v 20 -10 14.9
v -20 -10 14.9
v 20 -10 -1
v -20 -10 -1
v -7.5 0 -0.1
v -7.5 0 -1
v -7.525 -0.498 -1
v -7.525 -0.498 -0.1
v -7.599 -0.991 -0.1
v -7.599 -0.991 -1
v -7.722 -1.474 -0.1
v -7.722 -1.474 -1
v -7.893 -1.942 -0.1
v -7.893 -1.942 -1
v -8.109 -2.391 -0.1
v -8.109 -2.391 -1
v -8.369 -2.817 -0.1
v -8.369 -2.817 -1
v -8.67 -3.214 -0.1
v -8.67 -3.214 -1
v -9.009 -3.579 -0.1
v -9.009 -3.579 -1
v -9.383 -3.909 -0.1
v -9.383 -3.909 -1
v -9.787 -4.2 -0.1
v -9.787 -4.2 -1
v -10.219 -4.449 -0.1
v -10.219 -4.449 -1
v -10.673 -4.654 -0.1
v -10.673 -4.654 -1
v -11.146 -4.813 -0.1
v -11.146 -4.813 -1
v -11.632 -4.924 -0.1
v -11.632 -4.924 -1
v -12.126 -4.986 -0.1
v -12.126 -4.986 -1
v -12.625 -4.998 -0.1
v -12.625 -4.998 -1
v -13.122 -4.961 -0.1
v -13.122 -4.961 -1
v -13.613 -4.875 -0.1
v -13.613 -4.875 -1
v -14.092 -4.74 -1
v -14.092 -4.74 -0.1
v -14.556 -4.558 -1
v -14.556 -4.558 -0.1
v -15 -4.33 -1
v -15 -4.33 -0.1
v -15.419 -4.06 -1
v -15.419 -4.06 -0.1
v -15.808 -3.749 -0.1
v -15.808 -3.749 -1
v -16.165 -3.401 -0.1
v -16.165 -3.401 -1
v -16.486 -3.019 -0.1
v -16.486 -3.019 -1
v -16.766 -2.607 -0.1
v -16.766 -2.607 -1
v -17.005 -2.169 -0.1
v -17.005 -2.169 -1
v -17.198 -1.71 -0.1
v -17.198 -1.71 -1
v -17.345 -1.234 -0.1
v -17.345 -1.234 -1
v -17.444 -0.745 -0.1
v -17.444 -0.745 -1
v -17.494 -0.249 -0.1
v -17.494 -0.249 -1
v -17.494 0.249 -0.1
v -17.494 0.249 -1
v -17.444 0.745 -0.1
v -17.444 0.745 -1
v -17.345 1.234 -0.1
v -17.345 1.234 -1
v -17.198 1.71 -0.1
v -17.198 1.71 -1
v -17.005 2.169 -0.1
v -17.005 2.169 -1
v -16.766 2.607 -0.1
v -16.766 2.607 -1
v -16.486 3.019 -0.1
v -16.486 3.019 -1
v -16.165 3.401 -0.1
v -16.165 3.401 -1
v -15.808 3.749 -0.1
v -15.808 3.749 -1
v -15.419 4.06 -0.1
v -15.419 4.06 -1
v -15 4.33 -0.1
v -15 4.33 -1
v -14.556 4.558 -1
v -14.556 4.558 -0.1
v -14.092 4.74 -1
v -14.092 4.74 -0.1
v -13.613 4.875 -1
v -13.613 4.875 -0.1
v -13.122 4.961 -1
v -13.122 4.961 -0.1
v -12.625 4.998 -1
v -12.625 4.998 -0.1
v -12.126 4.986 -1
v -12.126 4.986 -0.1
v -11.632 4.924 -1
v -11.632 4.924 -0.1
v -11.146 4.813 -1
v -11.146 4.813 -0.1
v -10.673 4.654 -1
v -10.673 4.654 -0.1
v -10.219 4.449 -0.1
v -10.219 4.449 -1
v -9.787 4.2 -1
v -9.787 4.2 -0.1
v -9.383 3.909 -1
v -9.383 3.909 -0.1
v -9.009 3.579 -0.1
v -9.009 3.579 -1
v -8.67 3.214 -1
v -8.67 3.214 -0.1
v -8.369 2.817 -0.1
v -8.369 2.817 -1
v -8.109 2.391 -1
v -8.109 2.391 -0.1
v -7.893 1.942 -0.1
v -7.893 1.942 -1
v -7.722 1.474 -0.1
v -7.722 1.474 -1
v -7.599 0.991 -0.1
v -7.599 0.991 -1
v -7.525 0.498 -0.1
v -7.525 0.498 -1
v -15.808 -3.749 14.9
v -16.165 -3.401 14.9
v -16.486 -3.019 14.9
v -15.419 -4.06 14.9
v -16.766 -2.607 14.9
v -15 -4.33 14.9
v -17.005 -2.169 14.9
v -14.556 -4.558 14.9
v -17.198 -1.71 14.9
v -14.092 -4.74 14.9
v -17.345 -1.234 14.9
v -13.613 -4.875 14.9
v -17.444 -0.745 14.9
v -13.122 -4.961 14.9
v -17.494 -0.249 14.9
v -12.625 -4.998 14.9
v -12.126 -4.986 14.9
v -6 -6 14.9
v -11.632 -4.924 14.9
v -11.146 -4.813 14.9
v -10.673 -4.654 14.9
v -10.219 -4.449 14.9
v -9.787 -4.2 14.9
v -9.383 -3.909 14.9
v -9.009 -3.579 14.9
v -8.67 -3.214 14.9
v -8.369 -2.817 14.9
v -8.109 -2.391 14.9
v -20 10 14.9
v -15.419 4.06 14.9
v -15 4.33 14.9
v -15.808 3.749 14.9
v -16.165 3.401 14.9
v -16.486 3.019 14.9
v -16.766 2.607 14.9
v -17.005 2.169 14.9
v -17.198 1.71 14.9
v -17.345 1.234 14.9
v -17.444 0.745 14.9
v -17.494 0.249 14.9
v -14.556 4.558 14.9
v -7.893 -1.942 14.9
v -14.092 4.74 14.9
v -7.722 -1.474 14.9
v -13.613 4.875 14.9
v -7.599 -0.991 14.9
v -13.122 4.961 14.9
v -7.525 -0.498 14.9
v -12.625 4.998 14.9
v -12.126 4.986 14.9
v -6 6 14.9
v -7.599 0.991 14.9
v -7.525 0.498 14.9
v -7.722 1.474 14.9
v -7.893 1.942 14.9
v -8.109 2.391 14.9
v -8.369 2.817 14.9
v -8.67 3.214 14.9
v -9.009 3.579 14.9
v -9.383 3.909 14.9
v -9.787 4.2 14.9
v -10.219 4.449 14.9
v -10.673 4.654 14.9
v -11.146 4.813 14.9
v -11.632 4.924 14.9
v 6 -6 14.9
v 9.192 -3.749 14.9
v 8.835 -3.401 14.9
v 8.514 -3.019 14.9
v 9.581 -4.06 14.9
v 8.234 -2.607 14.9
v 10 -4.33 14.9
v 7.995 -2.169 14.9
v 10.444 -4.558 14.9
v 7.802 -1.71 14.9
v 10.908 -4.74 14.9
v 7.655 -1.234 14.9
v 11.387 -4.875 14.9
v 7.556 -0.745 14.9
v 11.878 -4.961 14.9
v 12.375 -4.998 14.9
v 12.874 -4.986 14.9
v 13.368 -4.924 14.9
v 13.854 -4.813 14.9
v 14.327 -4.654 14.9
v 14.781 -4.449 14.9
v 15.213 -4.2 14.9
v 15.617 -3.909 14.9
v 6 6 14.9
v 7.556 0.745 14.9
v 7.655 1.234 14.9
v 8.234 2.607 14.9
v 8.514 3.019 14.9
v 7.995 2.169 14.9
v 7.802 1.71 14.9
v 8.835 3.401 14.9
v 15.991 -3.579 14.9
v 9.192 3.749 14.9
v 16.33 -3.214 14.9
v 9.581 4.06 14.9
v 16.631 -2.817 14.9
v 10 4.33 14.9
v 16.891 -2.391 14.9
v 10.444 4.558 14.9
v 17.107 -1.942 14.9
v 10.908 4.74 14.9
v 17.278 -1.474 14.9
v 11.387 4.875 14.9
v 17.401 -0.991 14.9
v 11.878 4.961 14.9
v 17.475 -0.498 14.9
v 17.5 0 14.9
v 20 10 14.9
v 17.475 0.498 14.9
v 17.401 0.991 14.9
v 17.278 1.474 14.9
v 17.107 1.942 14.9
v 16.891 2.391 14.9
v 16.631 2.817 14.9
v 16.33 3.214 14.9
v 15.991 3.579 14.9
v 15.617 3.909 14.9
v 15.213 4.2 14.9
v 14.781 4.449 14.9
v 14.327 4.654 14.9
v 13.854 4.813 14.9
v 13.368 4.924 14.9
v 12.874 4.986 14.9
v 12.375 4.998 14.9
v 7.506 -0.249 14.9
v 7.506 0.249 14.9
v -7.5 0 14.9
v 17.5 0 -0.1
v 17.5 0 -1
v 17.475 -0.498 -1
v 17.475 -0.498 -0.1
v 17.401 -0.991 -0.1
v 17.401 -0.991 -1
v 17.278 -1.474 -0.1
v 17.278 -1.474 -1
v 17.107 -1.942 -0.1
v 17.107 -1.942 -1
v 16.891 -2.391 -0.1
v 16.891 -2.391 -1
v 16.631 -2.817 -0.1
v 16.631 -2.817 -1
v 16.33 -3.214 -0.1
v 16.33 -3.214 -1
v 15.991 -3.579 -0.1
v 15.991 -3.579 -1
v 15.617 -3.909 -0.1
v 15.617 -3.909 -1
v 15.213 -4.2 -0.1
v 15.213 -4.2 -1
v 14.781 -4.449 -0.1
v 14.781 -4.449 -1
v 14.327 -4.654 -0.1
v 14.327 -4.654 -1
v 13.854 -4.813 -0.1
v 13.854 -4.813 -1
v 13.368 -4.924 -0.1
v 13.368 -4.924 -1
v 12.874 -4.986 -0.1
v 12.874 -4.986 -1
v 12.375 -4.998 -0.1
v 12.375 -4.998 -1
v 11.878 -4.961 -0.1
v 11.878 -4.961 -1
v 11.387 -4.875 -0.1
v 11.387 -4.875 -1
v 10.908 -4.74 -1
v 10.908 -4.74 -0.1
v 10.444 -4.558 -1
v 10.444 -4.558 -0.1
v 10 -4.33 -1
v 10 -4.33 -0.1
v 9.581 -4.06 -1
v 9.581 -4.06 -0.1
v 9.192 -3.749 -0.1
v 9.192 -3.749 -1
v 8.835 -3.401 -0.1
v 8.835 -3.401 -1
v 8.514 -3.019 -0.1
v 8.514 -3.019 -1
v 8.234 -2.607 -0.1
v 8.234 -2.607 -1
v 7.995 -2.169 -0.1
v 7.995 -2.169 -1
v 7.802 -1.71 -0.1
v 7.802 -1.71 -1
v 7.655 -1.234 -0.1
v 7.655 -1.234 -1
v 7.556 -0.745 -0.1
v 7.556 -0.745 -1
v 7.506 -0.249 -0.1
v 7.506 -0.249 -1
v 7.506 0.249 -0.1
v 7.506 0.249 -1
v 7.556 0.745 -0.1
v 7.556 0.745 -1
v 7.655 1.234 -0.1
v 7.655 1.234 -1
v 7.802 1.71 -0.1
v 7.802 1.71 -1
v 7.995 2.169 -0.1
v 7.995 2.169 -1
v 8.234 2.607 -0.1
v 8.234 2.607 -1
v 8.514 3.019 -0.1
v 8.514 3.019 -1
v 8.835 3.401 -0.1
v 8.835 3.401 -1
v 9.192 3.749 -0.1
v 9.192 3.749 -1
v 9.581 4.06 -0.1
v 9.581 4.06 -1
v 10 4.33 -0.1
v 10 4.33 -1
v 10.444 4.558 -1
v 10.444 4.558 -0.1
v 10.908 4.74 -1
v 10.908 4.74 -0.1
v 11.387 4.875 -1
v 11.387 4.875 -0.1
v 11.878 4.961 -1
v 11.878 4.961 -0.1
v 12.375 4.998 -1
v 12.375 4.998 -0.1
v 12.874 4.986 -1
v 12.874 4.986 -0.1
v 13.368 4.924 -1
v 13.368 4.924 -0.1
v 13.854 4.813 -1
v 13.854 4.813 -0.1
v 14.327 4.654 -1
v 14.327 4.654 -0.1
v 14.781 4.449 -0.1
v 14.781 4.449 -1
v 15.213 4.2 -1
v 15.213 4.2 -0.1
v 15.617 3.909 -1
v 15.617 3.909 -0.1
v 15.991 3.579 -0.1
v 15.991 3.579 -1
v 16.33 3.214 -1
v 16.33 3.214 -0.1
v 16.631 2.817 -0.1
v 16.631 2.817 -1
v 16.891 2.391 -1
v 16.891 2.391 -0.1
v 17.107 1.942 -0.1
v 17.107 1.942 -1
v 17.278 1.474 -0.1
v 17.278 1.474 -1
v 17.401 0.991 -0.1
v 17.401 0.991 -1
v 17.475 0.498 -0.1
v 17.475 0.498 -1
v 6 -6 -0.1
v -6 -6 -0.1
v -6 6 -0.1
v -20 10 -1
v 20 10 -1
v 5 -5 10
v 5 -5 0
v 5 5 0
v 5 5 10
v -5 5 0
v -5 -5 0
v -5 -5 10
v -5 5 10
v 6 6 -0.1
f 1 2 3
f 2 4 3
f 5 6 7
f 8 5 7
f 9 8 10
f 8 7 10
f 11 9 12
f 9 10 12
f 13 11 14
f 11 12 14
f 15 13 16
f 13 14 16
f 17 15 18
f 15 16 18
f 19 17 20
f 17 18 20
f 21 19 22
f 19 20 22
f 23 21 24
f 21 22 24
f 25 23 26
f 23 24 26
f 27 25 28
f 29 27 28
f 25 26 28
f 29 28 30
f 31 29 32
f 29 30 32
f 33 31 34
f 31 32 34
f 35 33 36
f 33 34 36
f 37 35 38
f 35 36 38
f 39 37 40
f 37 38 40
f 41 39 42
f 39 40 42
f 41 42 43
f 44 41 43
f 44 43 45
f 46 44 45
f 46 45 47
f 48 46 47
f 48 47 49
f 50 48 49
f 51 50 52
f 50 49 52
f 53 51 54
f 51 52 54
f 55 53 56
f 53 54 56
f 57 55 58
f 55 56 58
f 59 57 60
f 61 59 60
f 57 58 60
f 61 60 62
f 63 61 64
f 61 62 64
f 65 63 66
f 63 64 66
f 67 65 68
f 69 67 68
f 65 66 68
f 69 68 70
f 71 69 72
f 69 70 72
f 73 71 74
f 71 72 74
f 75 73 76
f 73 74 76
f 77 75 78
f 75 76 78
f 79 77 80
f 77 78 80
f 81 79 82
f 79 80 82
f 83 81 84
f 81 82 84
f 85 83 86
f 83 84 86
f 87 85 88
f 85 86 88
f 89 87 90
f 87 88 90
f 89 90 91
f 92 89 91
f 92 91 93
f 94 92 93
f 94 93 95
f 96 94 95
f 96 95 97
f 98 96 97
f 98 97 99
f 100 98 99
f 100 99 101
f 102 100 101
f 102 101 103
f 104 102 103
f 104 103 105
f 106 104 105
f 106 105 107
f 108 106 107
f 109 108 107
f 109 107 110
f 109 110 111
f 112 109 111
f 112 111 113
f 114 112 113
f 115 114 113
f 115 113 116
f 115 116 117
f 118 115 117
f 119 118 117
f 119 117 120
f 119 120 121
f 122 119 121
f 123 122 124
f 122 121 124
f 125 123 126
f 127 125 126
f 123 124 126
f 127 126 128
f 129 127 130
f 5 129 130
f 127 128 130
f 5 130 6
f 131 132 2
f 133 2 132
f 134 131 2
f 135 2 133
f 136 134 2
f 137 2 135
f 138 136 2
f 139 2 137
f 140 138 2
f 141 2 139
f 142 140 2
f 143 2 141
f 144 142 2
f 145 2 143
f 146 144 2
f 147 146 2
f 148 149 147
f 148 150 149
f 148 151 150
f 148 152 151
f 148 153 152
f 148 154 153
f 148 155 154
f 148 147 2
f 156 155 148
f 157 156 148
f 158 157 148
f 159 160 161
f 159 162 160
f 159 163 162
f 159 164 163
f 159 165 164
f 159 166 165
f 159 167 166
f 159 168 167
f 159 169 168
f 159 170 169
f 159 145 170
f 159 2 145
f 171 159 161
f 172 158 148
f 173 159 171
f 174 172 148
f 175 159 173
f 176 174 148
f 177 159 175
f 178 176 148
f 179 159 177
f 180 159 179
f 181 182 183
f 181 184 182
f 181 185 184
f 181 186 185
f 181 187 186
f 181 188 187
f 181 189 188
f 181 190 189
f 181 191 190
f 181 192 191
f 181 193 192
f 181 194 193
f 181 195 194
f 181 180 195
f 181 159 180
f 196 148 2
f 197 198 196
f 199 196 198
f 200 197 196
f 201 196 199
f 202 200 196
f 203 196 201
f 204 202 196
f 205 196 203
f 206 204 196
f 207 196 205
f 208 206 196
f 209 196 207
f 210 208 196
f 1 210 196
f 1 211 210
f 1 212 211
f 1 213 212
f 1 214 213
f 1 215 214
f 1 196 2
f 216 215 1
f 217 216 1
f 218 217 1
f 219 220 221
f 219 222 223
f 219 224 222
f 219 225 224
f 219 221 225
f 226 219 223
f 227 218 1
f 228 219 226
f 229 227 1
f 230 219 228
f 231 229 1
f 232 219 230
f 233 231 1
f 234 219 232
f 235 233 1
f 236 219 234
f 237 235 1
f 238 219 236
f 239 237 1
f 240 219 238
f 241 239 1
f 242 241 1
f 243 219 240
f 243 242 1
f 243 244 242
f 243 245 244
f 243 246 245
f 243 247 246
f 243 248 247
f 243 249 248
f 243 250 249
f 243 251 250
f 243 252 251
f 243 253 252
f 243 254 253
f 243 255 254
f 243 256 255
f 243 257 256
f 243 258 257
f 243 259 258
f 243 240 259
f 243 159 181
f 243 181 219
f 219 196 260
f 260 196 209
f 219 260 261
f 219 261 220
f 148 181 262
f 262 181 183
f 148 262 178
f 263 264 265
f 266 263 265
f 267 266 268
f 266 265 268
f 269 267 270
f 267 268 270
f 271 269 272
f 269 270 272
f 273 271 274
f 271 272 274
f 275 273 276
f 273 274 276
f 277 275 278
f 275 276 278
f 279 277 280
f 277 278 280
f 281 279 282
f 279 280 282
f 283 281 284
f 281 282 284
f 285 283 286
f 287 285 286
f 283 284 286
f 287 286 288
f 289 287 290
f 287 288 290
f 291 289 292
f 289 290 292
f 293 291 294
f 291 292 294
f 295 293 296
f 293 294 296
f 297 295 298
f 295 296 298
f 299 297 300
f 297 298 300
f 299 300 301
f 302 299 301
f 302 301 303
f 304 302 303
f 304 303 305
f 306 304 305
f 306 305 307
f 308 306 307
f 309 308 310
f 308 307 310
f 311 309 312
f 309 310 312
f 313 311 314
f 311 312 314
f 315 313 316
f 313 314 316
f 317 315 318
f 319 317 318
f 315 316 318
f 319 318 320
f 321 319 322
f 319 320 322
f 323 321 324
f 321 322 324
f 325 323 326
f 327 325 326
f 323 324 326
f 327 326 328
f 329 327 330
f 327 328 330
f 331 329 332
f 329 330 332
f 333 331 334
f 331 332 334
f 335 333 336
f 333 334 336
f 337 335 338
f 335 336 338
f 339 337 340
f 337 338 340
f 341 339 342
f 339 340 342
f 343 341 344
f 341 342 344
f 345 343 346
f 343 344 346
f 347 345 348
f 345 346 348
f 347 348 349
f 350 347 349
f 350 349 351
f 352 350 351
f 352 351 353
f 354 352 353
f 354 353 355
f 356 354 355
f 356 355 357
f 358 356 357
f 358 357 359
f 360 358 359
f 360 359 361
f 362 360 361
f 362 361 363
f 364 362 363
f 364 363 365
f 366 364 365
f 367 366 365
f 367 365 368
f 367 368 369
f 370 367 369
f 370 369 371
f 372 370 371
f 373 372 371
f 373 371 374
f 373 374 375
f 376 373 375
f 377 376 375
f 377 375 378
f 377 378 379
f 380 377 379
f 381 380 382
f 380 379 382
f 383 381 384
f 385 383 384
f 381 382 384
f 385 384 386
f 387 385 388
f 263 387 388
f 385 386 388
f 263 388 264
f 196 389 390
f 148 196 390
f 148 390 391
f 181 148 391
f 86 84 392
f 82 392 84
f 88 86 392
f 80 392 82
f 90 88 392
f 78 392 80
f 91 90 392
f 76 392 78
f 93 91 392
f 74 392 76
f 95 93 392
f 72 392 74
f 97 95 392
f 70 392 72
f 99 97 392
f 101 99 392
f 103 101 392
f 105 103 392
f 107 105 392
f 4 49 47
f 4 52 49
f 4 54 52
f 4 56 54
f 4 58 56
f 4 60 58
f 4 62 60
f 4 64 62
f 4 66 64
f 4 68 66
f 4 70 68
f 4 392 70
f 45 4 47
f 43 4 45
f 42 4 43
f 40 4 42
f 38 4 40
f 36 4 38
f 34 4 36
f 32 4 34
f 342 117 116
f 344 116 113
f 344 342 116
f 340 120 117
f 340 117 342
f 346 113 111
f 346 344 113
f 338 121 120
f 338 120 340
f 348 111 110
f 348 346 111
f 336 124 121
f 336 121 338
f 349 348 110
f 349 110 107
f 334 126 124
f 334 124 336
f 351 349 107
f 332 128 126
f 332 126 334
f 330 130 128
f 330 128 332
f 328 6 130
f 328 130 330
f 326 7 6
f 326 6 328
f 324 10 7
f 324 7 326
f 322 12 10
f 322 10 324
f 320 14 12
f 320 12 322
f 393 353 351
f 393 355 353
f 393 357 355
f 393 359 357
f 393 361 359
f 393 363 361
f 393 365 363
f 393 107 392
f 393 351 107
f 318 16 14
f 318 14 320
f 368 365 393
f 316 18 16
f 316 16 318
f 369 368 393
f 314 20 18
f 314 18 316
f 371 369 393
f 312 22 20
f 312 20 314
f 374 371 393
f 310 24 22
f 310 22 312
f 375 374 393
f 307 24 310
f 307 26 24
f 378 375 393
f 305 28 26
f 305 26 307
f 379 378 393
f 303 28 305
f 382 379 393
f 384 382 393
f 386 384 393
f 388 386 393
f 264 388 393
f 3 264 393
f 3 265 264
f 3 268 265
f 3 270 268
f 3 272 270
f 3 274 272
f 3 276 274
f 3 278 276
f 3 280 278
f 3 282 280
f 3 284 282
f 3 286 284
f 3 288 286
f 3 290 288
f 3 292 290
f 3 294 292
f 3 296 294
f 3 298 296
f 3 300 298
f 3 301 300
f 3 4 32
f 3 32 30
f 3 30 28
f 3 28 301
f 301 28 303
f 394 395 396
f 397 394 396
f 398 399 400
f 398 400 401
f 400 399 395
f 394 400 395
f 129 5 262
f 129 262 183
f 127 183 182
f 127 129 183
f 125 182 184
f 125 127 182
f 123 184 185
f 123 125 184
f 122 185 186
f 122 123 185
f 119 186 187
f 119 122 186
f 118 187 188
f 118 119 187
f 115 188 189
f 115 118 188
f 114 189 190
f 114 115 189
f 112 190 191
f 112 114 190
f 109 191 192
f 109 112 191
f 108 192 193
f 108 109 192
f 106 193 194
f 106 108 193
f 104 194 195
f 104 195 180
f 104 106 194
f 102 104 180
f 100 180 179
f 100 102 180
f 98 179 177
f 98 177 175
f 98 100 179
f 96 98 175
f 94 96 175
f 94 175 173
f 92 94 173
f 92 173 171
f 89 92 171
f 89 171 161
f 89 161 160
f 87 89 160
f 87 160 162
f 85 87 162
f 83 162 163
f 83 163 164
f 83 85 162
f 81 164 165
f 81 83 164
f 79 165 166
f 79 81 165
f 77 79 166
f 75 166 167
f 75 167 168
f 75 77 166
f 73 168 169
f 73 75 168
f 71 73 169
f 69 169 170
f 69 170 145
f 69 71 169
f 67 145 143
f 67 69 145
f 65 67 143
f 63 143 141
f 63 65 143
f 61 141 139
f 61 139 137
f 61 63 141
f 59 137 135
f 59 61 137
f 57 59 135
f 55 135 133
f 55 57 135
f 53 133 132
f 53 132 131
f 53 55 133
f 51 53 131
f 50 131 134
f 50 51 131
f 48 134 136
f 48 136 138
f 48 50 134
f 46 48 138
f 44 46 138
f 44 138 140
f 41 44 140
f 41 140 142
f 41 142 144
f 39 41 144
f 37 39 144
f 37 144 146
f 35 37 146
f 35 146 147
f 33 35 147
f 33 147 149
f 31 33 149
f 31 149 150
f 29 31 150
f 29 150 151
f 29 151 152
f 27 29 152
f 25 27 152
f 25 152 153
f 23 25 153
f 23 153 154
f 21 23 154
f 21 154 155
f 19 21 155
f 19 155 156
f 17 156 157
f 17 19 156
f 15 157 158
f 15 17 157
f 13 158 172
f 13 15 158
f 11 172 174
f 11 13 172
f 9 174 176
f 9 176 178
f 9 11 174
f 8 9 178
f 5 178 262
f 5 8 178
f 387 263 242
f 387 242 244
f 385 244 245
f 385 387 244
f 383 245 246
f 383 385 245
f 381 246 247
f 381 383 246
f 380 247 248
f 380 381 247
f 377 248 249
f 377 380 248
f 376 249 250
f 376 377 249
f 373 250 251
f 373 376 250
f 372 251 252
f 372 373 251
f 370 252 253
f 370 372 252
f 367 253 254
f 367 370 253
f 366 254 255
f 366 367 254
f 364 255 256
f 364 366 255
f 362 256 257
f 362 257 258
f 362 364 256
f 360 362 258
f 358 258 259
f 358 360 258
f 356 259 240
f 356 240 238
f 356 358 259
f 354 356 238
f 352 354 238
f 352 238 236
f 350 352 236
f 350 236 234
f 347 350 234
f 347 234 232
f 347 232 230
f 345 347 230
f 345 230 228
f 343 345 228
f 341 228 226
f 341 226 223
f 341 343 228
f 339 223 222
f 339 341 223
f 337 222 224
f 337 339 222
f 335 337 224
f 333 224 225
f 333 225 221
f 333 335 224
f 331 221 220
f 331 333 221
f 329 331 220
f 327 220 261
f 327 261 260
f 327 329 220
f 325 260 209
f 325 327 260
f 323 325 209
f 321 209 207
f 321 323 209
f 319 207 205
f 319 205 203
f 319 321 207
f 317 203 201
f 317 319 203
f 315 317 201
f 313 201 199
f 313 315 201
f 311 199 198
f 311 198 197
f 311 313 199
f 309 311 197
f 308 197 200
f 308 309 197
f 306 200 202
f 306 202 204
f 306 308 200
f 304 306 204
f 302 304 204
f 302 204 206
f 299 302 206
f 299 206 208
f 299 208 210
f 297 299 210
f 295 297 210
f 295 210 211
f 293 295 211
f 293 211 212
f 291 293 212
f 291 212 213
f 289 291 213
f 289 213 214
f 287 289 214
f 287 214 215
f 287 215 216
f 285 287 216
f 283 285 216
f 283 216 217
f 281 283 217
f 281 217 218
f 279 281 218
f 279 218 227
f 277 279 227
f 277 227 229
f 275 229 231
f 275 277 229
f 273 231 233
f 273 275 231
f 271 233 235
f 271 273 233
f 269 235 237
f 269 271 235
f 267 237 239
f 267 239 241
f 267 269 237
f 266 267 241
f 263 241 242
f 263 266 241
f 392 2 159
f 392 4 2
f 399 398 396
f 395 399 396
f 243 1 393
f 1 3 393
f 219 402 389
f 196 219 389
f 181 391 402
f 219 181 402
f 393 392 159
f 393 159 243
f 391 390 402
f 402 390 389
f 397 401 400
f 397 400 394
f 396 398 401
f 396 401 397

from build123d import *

# Parameters (mm, degrees)
F0_W     = 10
F0_H     = 10
F1_DEPTH = 10
F3_W     = 40
F3_H     = 20
F3_R     = 5
F4_DEPTH = 0.9
F5_W     = 40
F5_H     = 20
F5_R     = 5
F6_DEPTH = 15


with BuildPart() as f1:
    # F0 (on Top) → F1 (new body)
    with BuildSketch(Plane.XY):
        Rectangle(F0_W, F0_H)
    extrude(amount=F1_DEPTH)


with BuildPart() as f4:
    # F3 (on offset) → F4 (new body)
    with BuildSketch(Plane(origin=(0, 0, -1), x_dir=(1, 0, 0), z_dir=(0, 0, -1))):
        Rectangle(F3_W, F3_H)
        with Locations((-12.5, 0)):
            Circle(F3_R, mode=Mode.SUBTRACT)
        with Locations((12.5, 0)):
            Circle(F3_R, mode=Mode.SUBTRACT)
    extrude(amount=-F4_DEPTH)

    # F5 (on face) → F6 (join)
    with BuildSketch(Plane.XY.offset(-0.1)):
        Rectangle(F5_W, F5_H)
        with Locations((-12.5, 0)):
            Circle(F5_R, mode=Mode.SUBTRACT)
        Polygon((0, 6), (6, 6), (6, -6), (0, -6), (-6, -6), (-6, 6), align=None, mode=Mode.SUBTRACT)
        with Locations((12.5, 0)):
            Circle(F5_R, mode=Mode.SUBTRACT)
    extrude(amount=F6_DEPTH)


solid = Compound([f1.part, f4.part])
